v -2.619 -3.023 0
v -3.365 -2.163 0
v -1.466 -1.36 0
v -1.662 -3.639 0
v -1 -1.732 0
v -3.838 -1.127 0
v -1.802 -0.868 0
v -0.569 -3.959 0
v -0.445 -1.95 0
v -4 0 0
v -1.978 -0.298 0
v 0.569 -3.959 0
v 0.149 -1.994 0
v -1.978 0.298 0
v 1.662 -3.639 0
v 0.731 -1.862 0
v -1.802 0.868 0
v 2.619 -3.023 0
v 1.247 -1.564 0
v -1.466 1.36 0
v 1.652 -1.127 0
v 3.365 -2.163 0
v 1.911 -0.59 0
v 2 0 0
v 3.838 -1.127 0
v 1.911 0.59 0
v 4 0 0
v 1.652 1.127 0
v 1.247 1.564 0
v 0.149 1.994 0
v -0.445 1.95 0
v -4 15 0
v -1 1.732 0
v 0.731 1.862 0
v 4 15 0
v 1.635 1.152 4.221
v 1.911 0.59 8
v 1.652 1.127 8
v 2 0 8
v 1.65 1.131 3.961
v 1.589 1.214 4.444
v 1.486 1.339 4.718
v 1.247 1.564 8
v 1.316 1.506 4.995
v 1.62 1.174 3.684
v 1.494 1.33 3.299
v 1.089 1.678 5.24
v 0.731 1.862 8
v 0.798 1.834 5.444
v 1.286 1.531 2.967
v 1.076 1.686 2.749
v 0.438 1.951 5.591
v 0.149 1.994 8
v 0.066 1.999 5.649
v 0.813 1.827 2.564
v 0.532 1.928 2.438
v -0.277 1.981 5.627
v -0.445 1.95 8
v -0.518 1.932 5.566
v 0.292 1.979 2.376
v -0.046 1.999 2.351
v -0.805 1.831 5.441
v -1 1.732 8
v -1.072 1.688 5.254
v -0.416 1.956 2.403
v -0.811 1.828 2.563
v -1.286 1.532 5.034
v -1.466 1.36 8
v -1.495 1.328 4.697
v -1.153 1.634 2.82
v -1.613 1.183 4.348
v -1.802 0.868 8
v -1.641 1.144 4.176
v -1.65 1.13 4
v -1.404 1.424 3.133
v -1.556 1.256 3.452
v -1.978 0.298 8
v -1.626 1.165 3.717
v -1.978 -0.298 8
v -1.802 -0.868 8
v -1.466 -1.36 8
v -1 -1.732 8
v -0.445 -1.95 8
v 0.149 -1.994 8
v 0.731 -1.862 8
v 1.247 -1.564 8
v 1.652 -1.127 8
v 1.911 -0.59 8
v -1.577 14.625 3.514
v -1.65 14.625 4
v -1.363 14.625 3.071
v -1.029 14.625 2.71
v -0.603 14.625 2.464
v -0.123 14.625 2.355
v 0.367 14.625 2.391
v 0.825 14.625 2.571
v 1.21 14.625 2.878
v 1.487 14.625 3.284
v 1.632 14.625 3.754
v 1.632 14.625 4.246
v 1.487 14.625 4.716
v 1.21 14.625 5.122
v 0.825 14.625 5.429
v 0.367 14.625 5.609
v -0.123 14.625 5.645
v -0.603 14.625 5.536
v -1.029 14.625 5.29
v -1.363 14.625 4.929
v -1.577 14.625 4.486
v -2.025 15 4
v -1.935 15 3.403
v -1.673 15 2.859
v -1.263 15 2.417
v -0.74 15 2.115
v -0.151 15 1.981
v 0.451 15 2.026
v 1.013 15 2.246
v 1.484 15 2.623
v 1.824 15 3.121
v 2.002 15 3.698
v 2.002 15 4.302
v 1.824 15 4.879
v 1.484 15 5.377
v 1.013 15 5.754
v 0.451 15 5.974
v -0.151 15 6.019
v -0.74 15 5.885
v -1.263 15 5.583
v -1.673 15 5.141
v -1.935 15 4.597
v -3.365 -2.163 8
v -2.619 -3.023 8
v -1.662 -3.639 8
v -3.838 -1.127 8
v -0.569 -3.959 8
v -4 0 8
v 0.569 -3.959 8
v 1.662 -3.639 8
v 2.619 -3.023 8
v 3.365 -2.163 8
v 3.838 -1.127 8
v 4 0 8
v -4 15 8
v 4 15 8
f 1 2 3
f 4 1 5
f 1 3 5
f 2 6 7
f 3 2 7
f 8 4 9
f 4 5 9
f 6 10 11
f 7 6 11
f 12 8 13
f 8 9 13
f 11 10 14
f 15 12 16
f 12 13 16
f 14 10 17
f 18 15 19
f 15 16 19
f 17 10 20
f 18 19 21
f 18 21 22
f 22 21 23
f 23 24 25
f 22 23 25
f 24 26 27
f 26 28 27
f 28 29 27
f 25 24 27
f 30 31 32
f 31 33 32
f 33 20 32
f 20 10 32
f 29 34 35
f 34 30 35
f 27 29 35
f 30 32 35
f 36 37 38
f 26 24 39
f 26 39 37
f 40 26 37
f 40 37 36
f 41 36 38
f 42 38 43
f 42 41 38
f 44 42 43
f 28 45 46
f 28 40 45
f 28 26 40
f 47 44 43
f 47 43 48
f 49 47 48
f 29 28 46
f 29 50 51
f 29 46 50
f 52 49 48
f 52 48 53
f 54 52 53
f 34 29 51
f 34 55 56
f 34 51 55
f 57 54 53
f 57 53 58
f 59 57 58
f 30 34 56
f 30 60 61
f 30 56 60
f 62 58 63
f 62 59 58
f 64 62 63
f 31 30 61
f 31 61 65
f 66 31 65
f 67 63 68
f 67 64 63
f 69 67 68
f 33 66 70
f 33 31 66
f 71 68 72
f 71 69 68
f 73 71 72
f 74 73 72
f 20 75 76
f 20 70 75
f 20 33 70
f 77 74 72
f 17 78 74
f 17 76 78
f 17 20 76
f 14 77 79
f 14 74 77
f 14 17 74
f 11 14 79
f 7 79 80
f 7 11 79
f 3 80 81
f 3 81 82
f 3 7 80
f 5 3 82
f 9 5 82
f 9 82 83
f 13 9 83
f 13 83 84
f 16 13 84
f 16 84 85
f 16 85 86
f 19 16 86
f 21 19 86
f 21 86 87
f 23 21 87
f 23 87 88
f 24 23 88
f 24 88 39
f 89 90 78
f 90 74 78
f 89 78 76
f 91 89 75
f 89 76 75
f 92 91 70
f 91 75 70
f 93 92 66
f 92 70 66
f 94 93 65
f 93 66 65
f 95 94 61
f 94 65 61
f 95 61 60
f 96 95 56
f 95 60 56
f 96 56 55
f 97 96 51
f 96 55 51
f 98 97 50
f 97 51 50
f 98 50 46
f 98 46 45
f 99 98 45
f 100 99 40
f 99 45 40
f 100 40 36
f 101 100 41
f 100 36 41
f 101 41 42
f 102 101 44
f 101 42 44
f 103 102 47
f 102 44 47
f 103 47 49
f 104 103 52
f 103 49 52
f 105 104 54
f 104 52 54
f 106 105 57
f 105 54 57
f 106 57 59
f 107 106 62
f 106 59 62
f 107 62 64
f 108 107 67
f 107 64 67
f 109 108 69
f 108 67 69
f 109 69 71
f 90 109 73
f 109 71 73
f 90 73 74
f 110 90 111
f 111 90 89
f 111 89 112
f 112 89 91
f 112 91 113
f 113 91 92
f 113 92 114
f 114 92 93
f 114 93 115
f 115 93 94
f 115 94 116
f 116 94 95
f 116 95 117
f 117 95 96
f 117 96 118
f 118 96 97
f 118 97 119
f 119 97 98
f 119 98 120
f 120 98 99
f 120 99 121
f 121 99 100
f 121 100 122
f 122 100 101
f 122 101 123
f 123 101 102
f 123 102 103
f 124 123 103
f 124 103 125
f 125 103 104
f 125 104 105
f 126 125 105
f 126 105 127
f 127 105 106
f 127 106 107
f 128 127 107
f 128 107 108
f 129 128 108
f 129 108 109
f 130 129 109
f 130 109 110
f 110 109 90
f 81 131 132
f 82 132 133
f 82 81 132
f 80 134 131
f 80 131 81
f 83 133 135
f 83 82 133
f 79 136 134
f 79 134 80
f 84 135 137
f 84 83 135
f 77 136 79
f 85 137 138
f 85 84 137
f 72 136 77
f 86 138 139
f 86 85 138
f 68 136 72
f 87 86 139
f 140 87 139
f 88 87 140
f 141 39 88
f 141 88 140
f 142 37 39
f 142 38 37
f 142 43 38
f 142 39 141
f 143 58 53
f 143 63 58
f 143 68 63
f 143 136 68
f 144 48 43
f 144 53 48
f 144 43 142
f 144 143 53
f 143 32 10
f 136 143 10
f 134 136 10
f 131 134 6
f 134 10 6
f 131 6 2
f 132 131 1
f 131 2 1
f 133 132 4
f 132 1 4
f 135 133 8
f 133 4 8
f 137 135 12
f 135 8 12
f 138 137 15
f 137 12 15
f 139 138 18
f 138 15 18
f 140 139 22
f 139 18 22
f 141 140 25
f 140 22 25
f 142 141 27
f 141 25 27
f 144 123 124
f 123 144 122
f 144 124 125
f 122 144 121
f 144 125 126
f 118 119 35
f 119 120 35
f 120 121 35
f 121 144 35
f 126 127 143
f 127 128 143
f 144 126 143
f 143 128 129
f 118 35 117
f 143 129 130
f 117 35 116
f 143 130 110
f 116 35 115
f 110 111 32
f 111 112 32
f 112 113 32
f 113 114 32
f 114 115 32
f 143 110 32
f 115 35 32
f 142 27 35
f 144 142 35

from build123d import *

# Parameters (mm, degrees)
SKETCH_1_R                  = 2
EXTRUDE_1_DEPTH             = 8
HOLE_WIZARD_M41_D           = 3.3
HOLE_WIZARD_M41_DEPTH       = 14.999
HOLE_WIZARD_M41_CSINK_D     = 4.05
HOLE_WIZARD_M41_CSINK_ANGLE = 90
HOLE_WIZARD_M41_TIP         = 0.991420021


with BuildPart() as part:
    # Эскиз1 → Бобышка-Вытянуть1 (new body)
    with BuildSketch(Plane.XY):
        with BuildLine():
            Line((-4, 15), (-4, 0))
            ThreePointArc((-4, 0), (0, -4), (4, 0))
            Line((4, 0), (4, 15))
            Line((4, 15), (-4, 15))
        make_face()
        Circle(SKETCH_1_R, mode=Mode.SUBTRACT)
    extrude(amount=EXTRUDE_1_DEPTH)

    # Отверстие обработанное метчиком M41
    with Locations(Plane(origin=(0, 15, 0), x_dir=(1, 0, 0), z_dir=(0, 1, 0))):
        with Locations((0, -4)):
            CounterSinkHole(HOLE_WIZARD_M41_D / 2, HOLE_WIZARD_M41_CSINK_D / 2, depth=HOLE_WIZARD_M41_DEPTH, counter_sink_angle=HOLE_WIZARD_M41_CSINK_ANGLE)
            with Locations((0, 0, -(HOLE_WIZARD_M41_DEPTH + HOLE_WIZARD_M41_TIP / 2))):  # 118° drill point
                Cone(0, HOLE_WIZARD_M41_D / 2, HOLE_WIZARD_M41_TIP, mode=Mode.SUBTRACT)


solid = part.part
